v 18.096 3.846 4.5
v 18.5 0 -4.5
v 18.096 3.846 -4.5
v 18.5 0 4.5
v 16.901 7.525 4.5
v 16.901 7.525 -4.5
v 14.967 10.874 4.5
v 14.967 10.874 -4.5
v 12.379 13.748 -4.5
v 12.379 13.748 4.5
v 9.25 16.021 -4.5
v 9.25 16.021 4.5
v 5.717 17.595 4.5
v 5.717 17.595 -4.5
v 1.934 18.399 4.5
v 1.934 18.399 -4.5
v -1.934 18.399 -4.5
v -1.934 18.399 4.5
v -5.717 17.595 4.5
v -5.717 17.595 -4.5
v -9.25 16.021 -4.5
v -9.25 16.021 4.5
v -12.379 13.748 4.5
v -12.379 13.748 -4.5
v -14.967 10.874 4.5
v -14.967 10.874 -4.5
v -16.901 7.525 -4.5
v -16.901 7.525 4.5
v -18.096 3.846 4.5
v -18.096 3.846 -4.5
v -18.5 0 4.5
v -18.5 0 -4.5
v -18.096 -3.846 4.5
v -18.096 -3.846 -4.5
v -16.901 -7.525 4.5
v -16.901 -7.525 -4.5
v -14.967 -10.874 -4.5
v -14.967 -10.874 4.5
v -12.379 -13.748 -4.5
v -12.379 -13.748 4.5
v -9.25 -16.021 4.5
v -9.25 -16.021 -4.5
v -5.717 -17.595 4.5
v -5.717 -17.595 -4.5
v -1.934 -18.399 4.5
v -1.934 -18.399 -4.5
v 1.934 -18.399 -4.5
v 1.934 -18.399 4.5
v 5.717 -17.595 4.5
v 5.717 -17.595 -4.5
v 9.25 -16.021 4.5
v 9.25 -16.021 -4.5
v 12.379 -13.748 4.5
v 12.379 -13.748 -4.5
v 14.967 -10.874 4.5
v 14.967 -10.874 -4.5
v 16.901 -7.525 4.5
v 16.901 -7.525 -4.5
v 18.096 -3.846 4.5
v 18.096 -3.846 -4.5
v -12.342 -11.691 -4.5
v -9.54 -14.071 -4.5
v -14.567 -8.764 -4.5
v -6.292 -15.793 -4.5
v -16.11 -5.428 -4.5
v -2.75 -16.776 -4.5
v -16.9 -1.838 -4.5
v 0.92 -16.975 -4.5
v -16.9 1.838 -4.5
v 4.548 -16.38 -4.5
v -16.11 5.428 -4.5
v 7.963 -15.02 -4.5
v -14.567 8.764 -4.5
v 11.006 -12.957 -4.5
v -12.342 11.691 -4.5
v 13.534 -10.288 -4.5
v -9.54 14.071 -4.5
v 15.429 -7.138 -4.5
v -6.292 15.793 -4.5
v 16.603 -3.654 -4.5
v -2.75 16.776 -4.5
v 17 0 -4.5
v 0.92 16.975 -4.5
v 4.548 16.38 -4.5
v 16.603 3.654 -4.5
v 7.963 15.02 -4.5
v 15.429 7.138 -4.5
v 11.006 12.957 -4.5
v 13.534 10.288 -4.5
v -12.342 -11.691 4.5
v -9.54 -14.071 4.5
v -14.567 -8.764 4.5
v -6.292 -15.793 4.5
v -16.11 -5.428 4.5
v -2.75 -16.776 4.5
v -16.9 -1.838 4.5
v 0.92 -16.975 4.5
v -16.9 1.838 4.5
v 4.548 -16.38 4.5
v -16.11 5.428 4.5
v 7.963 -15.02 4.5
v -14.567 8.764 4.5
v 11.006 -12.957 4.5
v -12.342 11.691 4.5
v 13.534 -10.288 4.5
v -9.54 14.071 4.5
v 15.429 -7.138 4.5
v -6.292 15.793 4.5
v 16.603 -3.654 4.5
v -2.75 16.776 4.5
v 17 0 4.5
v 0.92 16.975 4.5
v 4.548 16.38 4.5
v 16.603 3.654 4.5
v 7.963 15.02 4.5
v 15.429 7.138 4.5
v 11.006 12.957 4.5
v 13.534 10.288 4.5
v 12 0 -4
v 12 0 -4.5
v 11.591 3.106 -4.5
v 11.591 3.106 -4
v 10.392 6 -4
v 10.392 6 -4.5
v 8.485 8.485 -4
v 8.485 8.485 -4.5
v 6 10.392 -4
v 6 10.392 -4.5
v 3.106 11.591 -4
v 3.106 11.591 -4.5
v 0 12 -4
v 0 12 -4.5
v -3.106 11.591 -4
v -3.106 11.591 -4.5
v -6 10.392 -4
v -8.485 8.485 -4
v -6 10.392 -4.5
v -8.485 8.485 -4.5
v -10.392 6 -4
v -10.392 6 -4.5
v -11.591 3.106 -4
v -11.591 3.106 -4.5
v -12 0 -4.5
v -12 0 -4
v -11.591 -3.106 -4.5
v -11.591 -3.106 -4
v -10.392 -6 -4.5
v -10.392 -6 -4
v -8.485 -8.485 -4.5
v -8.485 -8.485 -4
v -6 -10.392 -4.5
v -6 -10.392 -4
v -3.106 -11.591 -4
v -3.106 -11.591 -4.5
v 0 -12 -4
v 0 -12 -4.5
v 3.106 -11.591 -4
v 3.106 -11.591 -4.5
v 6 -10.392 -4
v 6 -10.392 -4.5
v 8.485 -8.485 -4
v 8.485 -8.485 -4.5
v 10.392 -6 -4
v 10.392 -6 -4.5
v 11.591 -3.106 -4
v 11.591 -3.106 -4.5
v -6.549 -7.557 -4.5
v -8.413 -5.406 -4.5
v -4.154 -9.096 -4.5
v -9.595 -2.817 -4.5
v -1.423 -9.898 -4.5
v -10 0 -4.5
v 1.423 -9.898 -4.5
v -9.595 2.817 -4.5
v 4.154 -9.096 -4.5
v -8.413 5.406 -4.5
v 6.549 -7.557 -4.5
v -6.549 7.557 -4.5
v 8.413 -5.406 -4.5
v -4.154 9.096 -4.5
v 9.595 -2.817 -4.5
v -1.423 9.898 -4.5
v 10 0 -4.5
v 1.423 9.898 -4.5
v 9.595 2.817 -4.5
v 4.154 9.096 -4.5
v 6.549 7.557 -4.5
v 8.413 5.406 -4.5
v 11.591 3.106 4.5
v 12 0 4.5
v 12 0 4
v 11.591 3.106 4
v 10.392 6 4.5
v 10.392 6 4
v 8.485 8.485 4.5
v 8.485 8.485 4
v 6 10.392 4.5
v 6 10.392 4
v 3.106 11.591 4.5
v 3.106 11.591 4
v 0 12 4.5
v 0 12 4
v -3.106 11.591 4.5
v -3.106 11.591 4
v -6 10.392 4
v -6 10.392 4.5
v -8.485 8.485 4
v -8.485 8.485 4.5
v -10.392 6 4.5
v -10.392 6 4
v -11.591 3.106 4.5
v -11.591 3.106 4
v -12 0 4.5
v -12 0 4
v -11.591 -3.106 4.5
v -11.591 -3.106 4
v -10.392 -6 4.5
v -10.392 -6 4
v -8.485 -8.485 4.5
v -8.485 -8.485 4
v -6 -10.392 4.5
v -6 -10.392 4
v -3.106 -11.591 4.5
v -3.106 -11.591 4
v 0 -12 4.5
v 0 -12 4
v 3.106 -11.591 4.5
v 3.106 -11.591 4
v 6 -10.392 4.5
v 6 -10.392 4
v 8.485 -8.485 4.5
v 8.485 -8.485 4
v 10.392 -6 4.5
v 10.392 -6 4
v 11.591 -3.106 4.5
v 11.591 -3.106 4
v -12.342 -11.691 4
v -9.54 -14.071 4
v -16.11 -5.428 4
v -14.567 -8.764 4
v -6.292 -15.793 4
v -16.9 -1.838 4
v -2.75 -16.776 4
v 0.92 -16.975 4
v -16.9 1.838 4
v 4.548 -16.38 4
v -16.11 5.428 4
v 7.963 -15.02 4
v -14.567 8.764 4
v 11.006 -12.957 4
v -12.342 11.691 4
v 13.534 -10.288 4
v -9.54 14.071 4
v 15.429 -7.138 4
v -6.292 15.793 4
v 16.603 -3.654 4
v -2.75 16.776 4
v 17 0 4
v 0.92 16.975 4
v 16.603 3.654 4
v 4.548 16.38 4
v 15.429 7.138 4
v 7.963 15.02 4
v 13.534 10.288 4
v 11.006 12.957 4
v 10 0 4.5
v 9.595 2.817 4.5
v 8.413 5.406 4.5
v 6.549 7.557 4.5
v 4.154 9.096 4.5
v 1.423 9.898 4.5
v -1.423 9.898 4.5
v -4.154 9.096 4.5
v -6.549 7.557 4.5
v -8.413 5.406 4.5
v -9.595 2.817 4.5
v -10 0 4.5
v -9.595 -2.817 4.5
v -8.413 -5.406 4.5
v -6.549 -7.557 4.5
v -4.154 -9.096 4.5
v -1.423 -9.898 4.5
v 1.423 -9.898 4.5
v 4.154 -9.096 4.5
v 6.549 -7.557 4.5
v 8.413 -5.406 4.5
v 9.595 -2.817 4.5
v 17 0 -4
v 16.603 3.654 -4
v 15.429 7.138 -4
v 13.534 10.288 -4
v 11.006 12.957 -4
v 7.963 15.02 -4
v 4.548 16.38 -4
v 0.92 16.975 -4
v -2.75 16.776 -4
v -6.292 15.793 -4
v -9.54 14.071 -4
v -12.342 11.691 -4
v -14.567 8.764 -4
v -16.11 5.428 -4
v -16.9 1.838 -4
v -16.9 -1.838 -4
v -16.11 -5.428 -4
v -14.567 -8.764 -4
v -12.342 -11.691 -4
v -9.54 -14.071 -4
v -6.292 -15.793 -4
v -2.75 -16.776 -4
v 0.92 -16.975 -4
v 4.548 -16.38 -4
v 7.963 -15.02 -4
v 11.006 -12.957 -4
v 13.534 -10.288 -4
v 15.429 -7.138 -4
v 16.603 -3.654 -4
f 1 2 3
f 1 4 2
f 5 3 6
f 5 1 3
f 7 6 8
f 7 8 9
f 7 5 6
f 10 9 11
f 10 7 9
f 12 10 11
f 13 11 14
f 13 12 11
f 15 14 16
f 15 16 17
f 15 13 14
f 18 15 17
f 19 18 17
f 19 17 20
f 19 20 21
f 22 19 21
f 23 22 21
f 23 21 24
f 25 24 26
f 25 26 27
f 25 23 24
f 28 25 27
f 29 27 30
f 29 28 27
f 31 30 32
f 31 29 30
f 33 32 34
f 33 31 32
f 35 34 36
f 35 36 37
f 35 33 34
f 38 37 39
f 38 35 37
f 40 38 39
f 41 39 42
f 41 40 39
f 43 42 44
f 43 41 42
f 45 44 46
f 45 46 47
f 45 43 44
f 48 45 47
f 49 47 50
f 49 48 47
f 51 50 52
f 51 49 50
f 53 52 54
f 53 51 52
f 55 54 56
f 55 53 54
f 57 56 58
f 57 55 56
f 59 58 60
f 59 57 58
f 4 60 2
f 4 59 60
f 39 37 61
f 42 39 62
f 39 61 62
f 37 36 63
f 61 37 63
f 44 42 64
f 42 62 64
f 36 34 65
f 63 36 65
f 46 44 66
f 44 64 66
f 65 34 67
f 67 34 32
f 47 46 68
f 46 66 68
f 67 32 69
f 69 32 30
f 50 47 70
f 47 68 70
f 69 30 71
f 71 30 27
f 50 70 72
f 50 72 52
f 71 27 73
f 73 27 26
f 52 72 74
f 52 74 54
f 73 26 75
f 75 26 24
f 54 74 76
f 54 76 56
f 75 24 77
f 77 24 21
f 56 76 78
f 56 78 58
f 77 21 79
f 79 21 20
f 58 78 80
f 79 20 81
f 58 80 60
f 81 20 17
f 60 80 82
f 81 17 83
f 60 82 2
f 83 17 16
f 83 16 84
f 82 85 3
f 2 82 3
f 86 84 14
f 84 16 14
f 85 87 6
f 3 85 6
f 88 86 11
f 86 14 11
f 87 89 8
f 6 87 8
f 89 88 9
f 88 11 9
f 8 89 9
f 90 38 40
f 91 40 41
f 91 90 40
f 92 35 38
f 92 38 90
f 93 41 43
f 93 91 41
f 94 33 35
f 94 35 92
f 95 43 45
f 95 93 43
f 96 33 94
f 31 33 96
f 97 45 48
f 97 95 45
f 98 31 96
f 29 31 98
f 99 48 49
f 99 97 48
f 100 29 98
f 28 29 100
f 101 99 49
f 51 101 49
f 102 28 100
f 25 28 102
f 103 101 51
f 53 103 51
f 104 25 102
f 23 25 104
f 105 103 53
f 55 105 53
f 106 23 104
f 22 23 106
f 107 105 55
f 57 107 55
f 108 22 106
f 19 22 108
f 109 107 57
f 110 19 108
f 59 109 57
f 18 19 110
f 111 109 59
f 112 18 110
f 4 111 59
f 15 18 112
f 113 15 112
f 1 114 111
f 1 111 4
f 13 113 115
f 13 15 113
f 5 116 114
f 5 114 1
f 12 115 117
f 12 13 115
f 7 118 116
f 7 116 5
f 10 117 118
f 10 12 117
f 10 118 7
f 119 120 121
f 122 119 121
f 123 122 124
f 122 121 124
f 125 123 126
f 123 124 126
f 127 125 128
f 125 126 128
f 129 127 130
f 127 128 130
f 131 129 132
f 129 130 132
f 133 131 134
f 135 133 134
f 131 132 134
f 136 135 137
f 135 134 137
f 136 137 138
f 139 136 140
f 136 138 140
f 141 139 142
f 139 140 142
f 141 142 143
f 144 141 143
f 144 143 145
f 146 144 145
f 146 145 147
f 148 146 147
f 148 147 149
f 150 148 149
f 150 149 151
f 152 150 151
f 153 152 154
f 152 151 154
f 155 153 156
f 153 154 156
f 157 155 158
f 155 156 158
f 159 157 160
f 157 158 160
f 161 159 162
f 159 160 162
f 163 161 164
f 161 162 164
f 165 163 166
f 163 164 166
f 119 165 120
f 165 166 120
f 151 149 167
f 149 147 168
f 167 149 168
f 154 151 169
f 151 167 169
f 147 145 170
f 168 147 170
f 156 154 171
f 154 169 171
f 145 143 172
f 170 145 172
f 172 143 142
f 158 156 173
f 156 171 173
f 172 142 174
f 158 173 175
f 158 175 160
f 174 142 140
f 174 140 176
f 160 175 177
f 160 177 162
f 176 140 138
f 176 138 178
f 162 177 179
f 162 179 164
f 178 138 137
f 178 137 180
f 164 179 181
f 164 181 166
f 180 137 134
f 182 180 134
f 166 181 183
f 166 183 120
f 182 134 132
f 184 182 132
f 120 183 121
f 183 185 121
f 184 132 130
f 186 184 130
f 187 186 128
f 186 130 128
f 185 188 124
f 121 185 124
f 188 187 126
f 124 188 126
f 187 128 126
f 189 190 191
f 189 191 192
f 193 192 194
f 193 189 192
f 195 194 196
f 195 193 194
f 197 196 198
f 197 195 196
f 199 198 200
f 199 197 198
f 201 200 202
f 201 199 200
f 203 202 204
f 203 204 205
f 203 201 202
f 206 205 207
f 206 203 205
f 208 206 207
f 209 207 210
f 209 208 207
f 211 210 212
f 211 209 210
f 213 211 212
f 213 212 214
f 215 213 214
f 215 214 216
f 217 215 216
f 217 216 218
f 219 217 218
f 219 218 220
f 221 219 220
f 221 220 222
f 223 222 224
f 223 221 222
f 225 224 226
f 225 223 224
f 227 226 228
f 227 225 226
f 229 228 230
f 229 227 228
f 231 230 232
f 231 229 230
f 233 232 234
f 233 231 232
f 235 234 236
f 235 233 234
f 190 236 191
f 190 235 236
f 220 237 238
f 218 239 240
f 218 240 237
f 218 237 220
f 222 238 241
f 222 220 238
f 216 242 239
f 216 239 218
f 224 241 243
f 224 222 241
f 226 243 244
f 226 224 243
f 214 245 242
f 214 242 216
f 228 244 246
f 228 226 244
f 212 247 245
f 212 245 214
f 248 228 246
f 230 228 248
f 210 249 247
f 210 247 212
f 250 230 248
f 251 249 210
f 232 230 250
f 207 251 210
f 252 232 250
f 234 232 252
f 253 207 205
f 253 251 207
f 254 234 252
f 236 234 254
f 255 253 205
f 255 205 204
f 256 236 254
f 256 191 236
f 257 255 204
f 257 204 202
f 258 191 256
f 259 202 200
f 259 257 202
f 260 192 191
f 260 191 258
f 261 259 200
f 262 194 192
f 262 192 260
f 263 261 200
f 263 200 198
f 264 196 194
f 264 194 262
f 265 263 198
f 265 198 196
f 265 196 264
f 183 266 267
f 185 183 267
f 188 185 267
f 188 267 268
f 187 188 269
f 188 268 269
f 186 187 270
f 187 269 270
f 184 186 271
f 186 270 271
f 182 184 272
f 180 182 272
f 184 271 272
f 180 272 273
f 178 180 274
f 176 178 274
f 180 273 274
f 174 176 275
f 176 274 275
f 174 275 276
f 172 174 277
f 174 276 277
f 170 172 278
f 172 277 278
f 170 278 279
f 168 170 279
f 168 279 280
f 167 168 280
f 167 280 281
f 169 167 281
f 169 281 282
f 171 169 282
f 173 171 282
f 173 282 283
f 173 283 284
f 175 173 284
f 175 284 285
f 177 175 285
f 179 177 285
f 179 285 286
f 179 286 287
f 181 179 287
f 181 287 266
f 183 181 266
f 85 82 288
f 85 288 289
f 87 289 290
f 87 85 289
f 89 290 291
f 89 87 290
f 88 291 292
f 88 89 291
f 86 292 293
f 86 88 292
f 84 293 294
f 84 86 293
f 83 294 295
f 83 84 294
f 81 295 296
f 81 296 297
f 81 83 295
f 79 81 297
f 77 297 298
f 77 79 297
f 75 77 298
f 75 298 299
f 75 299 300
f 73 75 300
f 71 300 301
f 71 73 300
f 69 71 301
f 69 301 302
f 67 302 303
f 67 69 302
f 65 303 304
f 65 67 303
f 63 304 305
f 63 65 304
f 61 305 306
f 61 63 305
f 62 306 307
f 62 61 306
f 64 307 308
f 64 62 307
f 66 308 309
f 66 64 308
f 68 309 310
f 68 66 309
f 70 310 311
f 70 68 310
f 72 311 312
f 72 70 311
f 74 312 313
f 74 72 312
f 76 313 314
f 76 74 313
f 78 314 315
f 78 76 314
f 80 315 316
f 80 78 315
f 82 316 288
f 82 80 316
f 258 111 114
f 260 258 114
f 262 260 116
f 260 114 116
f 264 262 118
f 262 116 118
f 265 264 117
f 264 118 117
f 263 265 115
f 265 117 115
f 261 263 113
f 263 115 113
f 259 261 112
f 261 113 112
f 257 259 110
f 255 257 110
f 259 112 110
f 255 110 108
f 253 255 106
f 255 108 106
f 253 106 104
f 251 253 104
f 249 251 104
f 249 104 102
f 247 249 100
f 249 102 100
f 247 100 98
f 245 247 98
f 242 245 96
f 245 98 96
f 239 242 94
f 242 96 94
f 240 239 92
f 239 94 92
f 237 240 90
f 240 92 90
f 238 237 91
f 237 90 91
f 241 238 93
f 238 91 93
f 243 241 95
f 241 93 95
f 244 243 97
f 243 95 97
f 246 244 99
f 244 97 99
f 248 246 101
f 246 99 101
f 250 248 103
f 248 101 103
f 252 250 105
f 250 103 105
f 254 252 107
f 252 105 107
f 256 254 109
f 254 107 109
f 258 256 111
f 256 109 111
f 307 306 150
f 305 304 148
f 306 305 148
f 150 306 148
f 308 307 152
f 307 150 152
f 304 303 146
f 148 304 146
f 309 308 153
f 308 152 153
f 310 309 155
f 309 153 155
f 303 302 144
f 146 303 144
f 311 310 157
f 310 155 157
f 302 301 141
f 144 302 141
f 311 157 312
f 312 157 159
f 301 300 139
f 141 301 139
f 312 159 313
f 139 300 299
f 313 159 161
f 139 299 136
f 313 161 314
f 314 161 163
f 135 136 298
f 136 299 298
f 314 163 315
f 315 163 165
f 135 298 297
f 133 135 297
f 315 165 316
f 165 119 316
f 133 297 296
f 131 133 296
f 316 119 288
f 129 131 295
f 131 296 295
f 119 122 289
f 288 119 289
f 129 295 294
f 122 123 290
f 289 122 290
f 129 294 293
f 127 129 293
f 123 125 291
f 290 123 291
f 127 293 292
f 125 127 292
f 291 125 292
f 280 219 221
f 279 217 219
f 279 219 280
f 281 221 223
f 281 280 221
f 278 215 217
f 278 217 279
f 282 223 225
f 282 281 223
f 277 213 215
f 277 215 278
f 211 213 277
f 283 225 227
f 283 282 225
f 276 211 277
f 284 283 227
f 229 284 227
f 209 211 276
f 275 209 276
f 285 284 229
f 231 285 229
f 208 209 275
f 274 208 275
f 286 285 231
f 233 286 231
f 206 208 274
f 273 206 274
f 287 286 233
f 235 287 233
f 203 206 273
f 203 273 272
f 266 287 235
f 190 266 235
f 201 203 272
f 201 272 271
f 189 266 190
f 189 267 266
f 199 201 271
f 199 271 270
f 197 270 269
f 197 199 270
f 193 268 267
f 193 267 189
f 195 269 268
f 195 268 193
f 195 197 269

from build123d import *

# Parameters (mm, degrees)
SKETCH_1_R          = 18.5
EXTRUDE_1_DEPTH     = 4.5
SKETCH_2_R          = 10
CUT_EXTRUDE_1_DEPTH = 10
SKETCH_3_R          = 17
SKETCH_3_R_2        = 12
CUT_EXTRUDE_2_DEPTH = 0.5


with BuildPart() as part:
    # 草圖1 → 填料-伸長1 (new body, symmetric)
    with BuildSketch(Plane.XY):
        Circle(SKETCH_1_R)
    extrude(amount=EXTRUDE_1_DEPTH, both=True)

    # 草圖2 → 除料-伸長1 (cut, through all)
    with BuildSketch(Plane.XY.offset(4.5)):
        Circle(SKETCH_2_R)
    extrude(amount=-CUT_EXTRUDE_1_DEPTH, mode=Mode.SUBTRACT)

    # 草圖3 → 除料-伸長2 (cut)
    with BuildSketch(Plane.XY.offset(4.5)):
        Circle(SKETCH_3_R)
        Circle(SKETCH_3_R_2, mode=Mode.SUBTRACT)
    cut_extrude_2 = extrude(amount=-CUT_EXTRUDE_2_DEPTH, mode=Mode.SUBTRACT)

    # 鏡射1: 除料-伸長2 across plane
    add(cut_extrude_2.mirror(Plane.XY), mode=Mode.SUBTRACT)


solid = part.part
